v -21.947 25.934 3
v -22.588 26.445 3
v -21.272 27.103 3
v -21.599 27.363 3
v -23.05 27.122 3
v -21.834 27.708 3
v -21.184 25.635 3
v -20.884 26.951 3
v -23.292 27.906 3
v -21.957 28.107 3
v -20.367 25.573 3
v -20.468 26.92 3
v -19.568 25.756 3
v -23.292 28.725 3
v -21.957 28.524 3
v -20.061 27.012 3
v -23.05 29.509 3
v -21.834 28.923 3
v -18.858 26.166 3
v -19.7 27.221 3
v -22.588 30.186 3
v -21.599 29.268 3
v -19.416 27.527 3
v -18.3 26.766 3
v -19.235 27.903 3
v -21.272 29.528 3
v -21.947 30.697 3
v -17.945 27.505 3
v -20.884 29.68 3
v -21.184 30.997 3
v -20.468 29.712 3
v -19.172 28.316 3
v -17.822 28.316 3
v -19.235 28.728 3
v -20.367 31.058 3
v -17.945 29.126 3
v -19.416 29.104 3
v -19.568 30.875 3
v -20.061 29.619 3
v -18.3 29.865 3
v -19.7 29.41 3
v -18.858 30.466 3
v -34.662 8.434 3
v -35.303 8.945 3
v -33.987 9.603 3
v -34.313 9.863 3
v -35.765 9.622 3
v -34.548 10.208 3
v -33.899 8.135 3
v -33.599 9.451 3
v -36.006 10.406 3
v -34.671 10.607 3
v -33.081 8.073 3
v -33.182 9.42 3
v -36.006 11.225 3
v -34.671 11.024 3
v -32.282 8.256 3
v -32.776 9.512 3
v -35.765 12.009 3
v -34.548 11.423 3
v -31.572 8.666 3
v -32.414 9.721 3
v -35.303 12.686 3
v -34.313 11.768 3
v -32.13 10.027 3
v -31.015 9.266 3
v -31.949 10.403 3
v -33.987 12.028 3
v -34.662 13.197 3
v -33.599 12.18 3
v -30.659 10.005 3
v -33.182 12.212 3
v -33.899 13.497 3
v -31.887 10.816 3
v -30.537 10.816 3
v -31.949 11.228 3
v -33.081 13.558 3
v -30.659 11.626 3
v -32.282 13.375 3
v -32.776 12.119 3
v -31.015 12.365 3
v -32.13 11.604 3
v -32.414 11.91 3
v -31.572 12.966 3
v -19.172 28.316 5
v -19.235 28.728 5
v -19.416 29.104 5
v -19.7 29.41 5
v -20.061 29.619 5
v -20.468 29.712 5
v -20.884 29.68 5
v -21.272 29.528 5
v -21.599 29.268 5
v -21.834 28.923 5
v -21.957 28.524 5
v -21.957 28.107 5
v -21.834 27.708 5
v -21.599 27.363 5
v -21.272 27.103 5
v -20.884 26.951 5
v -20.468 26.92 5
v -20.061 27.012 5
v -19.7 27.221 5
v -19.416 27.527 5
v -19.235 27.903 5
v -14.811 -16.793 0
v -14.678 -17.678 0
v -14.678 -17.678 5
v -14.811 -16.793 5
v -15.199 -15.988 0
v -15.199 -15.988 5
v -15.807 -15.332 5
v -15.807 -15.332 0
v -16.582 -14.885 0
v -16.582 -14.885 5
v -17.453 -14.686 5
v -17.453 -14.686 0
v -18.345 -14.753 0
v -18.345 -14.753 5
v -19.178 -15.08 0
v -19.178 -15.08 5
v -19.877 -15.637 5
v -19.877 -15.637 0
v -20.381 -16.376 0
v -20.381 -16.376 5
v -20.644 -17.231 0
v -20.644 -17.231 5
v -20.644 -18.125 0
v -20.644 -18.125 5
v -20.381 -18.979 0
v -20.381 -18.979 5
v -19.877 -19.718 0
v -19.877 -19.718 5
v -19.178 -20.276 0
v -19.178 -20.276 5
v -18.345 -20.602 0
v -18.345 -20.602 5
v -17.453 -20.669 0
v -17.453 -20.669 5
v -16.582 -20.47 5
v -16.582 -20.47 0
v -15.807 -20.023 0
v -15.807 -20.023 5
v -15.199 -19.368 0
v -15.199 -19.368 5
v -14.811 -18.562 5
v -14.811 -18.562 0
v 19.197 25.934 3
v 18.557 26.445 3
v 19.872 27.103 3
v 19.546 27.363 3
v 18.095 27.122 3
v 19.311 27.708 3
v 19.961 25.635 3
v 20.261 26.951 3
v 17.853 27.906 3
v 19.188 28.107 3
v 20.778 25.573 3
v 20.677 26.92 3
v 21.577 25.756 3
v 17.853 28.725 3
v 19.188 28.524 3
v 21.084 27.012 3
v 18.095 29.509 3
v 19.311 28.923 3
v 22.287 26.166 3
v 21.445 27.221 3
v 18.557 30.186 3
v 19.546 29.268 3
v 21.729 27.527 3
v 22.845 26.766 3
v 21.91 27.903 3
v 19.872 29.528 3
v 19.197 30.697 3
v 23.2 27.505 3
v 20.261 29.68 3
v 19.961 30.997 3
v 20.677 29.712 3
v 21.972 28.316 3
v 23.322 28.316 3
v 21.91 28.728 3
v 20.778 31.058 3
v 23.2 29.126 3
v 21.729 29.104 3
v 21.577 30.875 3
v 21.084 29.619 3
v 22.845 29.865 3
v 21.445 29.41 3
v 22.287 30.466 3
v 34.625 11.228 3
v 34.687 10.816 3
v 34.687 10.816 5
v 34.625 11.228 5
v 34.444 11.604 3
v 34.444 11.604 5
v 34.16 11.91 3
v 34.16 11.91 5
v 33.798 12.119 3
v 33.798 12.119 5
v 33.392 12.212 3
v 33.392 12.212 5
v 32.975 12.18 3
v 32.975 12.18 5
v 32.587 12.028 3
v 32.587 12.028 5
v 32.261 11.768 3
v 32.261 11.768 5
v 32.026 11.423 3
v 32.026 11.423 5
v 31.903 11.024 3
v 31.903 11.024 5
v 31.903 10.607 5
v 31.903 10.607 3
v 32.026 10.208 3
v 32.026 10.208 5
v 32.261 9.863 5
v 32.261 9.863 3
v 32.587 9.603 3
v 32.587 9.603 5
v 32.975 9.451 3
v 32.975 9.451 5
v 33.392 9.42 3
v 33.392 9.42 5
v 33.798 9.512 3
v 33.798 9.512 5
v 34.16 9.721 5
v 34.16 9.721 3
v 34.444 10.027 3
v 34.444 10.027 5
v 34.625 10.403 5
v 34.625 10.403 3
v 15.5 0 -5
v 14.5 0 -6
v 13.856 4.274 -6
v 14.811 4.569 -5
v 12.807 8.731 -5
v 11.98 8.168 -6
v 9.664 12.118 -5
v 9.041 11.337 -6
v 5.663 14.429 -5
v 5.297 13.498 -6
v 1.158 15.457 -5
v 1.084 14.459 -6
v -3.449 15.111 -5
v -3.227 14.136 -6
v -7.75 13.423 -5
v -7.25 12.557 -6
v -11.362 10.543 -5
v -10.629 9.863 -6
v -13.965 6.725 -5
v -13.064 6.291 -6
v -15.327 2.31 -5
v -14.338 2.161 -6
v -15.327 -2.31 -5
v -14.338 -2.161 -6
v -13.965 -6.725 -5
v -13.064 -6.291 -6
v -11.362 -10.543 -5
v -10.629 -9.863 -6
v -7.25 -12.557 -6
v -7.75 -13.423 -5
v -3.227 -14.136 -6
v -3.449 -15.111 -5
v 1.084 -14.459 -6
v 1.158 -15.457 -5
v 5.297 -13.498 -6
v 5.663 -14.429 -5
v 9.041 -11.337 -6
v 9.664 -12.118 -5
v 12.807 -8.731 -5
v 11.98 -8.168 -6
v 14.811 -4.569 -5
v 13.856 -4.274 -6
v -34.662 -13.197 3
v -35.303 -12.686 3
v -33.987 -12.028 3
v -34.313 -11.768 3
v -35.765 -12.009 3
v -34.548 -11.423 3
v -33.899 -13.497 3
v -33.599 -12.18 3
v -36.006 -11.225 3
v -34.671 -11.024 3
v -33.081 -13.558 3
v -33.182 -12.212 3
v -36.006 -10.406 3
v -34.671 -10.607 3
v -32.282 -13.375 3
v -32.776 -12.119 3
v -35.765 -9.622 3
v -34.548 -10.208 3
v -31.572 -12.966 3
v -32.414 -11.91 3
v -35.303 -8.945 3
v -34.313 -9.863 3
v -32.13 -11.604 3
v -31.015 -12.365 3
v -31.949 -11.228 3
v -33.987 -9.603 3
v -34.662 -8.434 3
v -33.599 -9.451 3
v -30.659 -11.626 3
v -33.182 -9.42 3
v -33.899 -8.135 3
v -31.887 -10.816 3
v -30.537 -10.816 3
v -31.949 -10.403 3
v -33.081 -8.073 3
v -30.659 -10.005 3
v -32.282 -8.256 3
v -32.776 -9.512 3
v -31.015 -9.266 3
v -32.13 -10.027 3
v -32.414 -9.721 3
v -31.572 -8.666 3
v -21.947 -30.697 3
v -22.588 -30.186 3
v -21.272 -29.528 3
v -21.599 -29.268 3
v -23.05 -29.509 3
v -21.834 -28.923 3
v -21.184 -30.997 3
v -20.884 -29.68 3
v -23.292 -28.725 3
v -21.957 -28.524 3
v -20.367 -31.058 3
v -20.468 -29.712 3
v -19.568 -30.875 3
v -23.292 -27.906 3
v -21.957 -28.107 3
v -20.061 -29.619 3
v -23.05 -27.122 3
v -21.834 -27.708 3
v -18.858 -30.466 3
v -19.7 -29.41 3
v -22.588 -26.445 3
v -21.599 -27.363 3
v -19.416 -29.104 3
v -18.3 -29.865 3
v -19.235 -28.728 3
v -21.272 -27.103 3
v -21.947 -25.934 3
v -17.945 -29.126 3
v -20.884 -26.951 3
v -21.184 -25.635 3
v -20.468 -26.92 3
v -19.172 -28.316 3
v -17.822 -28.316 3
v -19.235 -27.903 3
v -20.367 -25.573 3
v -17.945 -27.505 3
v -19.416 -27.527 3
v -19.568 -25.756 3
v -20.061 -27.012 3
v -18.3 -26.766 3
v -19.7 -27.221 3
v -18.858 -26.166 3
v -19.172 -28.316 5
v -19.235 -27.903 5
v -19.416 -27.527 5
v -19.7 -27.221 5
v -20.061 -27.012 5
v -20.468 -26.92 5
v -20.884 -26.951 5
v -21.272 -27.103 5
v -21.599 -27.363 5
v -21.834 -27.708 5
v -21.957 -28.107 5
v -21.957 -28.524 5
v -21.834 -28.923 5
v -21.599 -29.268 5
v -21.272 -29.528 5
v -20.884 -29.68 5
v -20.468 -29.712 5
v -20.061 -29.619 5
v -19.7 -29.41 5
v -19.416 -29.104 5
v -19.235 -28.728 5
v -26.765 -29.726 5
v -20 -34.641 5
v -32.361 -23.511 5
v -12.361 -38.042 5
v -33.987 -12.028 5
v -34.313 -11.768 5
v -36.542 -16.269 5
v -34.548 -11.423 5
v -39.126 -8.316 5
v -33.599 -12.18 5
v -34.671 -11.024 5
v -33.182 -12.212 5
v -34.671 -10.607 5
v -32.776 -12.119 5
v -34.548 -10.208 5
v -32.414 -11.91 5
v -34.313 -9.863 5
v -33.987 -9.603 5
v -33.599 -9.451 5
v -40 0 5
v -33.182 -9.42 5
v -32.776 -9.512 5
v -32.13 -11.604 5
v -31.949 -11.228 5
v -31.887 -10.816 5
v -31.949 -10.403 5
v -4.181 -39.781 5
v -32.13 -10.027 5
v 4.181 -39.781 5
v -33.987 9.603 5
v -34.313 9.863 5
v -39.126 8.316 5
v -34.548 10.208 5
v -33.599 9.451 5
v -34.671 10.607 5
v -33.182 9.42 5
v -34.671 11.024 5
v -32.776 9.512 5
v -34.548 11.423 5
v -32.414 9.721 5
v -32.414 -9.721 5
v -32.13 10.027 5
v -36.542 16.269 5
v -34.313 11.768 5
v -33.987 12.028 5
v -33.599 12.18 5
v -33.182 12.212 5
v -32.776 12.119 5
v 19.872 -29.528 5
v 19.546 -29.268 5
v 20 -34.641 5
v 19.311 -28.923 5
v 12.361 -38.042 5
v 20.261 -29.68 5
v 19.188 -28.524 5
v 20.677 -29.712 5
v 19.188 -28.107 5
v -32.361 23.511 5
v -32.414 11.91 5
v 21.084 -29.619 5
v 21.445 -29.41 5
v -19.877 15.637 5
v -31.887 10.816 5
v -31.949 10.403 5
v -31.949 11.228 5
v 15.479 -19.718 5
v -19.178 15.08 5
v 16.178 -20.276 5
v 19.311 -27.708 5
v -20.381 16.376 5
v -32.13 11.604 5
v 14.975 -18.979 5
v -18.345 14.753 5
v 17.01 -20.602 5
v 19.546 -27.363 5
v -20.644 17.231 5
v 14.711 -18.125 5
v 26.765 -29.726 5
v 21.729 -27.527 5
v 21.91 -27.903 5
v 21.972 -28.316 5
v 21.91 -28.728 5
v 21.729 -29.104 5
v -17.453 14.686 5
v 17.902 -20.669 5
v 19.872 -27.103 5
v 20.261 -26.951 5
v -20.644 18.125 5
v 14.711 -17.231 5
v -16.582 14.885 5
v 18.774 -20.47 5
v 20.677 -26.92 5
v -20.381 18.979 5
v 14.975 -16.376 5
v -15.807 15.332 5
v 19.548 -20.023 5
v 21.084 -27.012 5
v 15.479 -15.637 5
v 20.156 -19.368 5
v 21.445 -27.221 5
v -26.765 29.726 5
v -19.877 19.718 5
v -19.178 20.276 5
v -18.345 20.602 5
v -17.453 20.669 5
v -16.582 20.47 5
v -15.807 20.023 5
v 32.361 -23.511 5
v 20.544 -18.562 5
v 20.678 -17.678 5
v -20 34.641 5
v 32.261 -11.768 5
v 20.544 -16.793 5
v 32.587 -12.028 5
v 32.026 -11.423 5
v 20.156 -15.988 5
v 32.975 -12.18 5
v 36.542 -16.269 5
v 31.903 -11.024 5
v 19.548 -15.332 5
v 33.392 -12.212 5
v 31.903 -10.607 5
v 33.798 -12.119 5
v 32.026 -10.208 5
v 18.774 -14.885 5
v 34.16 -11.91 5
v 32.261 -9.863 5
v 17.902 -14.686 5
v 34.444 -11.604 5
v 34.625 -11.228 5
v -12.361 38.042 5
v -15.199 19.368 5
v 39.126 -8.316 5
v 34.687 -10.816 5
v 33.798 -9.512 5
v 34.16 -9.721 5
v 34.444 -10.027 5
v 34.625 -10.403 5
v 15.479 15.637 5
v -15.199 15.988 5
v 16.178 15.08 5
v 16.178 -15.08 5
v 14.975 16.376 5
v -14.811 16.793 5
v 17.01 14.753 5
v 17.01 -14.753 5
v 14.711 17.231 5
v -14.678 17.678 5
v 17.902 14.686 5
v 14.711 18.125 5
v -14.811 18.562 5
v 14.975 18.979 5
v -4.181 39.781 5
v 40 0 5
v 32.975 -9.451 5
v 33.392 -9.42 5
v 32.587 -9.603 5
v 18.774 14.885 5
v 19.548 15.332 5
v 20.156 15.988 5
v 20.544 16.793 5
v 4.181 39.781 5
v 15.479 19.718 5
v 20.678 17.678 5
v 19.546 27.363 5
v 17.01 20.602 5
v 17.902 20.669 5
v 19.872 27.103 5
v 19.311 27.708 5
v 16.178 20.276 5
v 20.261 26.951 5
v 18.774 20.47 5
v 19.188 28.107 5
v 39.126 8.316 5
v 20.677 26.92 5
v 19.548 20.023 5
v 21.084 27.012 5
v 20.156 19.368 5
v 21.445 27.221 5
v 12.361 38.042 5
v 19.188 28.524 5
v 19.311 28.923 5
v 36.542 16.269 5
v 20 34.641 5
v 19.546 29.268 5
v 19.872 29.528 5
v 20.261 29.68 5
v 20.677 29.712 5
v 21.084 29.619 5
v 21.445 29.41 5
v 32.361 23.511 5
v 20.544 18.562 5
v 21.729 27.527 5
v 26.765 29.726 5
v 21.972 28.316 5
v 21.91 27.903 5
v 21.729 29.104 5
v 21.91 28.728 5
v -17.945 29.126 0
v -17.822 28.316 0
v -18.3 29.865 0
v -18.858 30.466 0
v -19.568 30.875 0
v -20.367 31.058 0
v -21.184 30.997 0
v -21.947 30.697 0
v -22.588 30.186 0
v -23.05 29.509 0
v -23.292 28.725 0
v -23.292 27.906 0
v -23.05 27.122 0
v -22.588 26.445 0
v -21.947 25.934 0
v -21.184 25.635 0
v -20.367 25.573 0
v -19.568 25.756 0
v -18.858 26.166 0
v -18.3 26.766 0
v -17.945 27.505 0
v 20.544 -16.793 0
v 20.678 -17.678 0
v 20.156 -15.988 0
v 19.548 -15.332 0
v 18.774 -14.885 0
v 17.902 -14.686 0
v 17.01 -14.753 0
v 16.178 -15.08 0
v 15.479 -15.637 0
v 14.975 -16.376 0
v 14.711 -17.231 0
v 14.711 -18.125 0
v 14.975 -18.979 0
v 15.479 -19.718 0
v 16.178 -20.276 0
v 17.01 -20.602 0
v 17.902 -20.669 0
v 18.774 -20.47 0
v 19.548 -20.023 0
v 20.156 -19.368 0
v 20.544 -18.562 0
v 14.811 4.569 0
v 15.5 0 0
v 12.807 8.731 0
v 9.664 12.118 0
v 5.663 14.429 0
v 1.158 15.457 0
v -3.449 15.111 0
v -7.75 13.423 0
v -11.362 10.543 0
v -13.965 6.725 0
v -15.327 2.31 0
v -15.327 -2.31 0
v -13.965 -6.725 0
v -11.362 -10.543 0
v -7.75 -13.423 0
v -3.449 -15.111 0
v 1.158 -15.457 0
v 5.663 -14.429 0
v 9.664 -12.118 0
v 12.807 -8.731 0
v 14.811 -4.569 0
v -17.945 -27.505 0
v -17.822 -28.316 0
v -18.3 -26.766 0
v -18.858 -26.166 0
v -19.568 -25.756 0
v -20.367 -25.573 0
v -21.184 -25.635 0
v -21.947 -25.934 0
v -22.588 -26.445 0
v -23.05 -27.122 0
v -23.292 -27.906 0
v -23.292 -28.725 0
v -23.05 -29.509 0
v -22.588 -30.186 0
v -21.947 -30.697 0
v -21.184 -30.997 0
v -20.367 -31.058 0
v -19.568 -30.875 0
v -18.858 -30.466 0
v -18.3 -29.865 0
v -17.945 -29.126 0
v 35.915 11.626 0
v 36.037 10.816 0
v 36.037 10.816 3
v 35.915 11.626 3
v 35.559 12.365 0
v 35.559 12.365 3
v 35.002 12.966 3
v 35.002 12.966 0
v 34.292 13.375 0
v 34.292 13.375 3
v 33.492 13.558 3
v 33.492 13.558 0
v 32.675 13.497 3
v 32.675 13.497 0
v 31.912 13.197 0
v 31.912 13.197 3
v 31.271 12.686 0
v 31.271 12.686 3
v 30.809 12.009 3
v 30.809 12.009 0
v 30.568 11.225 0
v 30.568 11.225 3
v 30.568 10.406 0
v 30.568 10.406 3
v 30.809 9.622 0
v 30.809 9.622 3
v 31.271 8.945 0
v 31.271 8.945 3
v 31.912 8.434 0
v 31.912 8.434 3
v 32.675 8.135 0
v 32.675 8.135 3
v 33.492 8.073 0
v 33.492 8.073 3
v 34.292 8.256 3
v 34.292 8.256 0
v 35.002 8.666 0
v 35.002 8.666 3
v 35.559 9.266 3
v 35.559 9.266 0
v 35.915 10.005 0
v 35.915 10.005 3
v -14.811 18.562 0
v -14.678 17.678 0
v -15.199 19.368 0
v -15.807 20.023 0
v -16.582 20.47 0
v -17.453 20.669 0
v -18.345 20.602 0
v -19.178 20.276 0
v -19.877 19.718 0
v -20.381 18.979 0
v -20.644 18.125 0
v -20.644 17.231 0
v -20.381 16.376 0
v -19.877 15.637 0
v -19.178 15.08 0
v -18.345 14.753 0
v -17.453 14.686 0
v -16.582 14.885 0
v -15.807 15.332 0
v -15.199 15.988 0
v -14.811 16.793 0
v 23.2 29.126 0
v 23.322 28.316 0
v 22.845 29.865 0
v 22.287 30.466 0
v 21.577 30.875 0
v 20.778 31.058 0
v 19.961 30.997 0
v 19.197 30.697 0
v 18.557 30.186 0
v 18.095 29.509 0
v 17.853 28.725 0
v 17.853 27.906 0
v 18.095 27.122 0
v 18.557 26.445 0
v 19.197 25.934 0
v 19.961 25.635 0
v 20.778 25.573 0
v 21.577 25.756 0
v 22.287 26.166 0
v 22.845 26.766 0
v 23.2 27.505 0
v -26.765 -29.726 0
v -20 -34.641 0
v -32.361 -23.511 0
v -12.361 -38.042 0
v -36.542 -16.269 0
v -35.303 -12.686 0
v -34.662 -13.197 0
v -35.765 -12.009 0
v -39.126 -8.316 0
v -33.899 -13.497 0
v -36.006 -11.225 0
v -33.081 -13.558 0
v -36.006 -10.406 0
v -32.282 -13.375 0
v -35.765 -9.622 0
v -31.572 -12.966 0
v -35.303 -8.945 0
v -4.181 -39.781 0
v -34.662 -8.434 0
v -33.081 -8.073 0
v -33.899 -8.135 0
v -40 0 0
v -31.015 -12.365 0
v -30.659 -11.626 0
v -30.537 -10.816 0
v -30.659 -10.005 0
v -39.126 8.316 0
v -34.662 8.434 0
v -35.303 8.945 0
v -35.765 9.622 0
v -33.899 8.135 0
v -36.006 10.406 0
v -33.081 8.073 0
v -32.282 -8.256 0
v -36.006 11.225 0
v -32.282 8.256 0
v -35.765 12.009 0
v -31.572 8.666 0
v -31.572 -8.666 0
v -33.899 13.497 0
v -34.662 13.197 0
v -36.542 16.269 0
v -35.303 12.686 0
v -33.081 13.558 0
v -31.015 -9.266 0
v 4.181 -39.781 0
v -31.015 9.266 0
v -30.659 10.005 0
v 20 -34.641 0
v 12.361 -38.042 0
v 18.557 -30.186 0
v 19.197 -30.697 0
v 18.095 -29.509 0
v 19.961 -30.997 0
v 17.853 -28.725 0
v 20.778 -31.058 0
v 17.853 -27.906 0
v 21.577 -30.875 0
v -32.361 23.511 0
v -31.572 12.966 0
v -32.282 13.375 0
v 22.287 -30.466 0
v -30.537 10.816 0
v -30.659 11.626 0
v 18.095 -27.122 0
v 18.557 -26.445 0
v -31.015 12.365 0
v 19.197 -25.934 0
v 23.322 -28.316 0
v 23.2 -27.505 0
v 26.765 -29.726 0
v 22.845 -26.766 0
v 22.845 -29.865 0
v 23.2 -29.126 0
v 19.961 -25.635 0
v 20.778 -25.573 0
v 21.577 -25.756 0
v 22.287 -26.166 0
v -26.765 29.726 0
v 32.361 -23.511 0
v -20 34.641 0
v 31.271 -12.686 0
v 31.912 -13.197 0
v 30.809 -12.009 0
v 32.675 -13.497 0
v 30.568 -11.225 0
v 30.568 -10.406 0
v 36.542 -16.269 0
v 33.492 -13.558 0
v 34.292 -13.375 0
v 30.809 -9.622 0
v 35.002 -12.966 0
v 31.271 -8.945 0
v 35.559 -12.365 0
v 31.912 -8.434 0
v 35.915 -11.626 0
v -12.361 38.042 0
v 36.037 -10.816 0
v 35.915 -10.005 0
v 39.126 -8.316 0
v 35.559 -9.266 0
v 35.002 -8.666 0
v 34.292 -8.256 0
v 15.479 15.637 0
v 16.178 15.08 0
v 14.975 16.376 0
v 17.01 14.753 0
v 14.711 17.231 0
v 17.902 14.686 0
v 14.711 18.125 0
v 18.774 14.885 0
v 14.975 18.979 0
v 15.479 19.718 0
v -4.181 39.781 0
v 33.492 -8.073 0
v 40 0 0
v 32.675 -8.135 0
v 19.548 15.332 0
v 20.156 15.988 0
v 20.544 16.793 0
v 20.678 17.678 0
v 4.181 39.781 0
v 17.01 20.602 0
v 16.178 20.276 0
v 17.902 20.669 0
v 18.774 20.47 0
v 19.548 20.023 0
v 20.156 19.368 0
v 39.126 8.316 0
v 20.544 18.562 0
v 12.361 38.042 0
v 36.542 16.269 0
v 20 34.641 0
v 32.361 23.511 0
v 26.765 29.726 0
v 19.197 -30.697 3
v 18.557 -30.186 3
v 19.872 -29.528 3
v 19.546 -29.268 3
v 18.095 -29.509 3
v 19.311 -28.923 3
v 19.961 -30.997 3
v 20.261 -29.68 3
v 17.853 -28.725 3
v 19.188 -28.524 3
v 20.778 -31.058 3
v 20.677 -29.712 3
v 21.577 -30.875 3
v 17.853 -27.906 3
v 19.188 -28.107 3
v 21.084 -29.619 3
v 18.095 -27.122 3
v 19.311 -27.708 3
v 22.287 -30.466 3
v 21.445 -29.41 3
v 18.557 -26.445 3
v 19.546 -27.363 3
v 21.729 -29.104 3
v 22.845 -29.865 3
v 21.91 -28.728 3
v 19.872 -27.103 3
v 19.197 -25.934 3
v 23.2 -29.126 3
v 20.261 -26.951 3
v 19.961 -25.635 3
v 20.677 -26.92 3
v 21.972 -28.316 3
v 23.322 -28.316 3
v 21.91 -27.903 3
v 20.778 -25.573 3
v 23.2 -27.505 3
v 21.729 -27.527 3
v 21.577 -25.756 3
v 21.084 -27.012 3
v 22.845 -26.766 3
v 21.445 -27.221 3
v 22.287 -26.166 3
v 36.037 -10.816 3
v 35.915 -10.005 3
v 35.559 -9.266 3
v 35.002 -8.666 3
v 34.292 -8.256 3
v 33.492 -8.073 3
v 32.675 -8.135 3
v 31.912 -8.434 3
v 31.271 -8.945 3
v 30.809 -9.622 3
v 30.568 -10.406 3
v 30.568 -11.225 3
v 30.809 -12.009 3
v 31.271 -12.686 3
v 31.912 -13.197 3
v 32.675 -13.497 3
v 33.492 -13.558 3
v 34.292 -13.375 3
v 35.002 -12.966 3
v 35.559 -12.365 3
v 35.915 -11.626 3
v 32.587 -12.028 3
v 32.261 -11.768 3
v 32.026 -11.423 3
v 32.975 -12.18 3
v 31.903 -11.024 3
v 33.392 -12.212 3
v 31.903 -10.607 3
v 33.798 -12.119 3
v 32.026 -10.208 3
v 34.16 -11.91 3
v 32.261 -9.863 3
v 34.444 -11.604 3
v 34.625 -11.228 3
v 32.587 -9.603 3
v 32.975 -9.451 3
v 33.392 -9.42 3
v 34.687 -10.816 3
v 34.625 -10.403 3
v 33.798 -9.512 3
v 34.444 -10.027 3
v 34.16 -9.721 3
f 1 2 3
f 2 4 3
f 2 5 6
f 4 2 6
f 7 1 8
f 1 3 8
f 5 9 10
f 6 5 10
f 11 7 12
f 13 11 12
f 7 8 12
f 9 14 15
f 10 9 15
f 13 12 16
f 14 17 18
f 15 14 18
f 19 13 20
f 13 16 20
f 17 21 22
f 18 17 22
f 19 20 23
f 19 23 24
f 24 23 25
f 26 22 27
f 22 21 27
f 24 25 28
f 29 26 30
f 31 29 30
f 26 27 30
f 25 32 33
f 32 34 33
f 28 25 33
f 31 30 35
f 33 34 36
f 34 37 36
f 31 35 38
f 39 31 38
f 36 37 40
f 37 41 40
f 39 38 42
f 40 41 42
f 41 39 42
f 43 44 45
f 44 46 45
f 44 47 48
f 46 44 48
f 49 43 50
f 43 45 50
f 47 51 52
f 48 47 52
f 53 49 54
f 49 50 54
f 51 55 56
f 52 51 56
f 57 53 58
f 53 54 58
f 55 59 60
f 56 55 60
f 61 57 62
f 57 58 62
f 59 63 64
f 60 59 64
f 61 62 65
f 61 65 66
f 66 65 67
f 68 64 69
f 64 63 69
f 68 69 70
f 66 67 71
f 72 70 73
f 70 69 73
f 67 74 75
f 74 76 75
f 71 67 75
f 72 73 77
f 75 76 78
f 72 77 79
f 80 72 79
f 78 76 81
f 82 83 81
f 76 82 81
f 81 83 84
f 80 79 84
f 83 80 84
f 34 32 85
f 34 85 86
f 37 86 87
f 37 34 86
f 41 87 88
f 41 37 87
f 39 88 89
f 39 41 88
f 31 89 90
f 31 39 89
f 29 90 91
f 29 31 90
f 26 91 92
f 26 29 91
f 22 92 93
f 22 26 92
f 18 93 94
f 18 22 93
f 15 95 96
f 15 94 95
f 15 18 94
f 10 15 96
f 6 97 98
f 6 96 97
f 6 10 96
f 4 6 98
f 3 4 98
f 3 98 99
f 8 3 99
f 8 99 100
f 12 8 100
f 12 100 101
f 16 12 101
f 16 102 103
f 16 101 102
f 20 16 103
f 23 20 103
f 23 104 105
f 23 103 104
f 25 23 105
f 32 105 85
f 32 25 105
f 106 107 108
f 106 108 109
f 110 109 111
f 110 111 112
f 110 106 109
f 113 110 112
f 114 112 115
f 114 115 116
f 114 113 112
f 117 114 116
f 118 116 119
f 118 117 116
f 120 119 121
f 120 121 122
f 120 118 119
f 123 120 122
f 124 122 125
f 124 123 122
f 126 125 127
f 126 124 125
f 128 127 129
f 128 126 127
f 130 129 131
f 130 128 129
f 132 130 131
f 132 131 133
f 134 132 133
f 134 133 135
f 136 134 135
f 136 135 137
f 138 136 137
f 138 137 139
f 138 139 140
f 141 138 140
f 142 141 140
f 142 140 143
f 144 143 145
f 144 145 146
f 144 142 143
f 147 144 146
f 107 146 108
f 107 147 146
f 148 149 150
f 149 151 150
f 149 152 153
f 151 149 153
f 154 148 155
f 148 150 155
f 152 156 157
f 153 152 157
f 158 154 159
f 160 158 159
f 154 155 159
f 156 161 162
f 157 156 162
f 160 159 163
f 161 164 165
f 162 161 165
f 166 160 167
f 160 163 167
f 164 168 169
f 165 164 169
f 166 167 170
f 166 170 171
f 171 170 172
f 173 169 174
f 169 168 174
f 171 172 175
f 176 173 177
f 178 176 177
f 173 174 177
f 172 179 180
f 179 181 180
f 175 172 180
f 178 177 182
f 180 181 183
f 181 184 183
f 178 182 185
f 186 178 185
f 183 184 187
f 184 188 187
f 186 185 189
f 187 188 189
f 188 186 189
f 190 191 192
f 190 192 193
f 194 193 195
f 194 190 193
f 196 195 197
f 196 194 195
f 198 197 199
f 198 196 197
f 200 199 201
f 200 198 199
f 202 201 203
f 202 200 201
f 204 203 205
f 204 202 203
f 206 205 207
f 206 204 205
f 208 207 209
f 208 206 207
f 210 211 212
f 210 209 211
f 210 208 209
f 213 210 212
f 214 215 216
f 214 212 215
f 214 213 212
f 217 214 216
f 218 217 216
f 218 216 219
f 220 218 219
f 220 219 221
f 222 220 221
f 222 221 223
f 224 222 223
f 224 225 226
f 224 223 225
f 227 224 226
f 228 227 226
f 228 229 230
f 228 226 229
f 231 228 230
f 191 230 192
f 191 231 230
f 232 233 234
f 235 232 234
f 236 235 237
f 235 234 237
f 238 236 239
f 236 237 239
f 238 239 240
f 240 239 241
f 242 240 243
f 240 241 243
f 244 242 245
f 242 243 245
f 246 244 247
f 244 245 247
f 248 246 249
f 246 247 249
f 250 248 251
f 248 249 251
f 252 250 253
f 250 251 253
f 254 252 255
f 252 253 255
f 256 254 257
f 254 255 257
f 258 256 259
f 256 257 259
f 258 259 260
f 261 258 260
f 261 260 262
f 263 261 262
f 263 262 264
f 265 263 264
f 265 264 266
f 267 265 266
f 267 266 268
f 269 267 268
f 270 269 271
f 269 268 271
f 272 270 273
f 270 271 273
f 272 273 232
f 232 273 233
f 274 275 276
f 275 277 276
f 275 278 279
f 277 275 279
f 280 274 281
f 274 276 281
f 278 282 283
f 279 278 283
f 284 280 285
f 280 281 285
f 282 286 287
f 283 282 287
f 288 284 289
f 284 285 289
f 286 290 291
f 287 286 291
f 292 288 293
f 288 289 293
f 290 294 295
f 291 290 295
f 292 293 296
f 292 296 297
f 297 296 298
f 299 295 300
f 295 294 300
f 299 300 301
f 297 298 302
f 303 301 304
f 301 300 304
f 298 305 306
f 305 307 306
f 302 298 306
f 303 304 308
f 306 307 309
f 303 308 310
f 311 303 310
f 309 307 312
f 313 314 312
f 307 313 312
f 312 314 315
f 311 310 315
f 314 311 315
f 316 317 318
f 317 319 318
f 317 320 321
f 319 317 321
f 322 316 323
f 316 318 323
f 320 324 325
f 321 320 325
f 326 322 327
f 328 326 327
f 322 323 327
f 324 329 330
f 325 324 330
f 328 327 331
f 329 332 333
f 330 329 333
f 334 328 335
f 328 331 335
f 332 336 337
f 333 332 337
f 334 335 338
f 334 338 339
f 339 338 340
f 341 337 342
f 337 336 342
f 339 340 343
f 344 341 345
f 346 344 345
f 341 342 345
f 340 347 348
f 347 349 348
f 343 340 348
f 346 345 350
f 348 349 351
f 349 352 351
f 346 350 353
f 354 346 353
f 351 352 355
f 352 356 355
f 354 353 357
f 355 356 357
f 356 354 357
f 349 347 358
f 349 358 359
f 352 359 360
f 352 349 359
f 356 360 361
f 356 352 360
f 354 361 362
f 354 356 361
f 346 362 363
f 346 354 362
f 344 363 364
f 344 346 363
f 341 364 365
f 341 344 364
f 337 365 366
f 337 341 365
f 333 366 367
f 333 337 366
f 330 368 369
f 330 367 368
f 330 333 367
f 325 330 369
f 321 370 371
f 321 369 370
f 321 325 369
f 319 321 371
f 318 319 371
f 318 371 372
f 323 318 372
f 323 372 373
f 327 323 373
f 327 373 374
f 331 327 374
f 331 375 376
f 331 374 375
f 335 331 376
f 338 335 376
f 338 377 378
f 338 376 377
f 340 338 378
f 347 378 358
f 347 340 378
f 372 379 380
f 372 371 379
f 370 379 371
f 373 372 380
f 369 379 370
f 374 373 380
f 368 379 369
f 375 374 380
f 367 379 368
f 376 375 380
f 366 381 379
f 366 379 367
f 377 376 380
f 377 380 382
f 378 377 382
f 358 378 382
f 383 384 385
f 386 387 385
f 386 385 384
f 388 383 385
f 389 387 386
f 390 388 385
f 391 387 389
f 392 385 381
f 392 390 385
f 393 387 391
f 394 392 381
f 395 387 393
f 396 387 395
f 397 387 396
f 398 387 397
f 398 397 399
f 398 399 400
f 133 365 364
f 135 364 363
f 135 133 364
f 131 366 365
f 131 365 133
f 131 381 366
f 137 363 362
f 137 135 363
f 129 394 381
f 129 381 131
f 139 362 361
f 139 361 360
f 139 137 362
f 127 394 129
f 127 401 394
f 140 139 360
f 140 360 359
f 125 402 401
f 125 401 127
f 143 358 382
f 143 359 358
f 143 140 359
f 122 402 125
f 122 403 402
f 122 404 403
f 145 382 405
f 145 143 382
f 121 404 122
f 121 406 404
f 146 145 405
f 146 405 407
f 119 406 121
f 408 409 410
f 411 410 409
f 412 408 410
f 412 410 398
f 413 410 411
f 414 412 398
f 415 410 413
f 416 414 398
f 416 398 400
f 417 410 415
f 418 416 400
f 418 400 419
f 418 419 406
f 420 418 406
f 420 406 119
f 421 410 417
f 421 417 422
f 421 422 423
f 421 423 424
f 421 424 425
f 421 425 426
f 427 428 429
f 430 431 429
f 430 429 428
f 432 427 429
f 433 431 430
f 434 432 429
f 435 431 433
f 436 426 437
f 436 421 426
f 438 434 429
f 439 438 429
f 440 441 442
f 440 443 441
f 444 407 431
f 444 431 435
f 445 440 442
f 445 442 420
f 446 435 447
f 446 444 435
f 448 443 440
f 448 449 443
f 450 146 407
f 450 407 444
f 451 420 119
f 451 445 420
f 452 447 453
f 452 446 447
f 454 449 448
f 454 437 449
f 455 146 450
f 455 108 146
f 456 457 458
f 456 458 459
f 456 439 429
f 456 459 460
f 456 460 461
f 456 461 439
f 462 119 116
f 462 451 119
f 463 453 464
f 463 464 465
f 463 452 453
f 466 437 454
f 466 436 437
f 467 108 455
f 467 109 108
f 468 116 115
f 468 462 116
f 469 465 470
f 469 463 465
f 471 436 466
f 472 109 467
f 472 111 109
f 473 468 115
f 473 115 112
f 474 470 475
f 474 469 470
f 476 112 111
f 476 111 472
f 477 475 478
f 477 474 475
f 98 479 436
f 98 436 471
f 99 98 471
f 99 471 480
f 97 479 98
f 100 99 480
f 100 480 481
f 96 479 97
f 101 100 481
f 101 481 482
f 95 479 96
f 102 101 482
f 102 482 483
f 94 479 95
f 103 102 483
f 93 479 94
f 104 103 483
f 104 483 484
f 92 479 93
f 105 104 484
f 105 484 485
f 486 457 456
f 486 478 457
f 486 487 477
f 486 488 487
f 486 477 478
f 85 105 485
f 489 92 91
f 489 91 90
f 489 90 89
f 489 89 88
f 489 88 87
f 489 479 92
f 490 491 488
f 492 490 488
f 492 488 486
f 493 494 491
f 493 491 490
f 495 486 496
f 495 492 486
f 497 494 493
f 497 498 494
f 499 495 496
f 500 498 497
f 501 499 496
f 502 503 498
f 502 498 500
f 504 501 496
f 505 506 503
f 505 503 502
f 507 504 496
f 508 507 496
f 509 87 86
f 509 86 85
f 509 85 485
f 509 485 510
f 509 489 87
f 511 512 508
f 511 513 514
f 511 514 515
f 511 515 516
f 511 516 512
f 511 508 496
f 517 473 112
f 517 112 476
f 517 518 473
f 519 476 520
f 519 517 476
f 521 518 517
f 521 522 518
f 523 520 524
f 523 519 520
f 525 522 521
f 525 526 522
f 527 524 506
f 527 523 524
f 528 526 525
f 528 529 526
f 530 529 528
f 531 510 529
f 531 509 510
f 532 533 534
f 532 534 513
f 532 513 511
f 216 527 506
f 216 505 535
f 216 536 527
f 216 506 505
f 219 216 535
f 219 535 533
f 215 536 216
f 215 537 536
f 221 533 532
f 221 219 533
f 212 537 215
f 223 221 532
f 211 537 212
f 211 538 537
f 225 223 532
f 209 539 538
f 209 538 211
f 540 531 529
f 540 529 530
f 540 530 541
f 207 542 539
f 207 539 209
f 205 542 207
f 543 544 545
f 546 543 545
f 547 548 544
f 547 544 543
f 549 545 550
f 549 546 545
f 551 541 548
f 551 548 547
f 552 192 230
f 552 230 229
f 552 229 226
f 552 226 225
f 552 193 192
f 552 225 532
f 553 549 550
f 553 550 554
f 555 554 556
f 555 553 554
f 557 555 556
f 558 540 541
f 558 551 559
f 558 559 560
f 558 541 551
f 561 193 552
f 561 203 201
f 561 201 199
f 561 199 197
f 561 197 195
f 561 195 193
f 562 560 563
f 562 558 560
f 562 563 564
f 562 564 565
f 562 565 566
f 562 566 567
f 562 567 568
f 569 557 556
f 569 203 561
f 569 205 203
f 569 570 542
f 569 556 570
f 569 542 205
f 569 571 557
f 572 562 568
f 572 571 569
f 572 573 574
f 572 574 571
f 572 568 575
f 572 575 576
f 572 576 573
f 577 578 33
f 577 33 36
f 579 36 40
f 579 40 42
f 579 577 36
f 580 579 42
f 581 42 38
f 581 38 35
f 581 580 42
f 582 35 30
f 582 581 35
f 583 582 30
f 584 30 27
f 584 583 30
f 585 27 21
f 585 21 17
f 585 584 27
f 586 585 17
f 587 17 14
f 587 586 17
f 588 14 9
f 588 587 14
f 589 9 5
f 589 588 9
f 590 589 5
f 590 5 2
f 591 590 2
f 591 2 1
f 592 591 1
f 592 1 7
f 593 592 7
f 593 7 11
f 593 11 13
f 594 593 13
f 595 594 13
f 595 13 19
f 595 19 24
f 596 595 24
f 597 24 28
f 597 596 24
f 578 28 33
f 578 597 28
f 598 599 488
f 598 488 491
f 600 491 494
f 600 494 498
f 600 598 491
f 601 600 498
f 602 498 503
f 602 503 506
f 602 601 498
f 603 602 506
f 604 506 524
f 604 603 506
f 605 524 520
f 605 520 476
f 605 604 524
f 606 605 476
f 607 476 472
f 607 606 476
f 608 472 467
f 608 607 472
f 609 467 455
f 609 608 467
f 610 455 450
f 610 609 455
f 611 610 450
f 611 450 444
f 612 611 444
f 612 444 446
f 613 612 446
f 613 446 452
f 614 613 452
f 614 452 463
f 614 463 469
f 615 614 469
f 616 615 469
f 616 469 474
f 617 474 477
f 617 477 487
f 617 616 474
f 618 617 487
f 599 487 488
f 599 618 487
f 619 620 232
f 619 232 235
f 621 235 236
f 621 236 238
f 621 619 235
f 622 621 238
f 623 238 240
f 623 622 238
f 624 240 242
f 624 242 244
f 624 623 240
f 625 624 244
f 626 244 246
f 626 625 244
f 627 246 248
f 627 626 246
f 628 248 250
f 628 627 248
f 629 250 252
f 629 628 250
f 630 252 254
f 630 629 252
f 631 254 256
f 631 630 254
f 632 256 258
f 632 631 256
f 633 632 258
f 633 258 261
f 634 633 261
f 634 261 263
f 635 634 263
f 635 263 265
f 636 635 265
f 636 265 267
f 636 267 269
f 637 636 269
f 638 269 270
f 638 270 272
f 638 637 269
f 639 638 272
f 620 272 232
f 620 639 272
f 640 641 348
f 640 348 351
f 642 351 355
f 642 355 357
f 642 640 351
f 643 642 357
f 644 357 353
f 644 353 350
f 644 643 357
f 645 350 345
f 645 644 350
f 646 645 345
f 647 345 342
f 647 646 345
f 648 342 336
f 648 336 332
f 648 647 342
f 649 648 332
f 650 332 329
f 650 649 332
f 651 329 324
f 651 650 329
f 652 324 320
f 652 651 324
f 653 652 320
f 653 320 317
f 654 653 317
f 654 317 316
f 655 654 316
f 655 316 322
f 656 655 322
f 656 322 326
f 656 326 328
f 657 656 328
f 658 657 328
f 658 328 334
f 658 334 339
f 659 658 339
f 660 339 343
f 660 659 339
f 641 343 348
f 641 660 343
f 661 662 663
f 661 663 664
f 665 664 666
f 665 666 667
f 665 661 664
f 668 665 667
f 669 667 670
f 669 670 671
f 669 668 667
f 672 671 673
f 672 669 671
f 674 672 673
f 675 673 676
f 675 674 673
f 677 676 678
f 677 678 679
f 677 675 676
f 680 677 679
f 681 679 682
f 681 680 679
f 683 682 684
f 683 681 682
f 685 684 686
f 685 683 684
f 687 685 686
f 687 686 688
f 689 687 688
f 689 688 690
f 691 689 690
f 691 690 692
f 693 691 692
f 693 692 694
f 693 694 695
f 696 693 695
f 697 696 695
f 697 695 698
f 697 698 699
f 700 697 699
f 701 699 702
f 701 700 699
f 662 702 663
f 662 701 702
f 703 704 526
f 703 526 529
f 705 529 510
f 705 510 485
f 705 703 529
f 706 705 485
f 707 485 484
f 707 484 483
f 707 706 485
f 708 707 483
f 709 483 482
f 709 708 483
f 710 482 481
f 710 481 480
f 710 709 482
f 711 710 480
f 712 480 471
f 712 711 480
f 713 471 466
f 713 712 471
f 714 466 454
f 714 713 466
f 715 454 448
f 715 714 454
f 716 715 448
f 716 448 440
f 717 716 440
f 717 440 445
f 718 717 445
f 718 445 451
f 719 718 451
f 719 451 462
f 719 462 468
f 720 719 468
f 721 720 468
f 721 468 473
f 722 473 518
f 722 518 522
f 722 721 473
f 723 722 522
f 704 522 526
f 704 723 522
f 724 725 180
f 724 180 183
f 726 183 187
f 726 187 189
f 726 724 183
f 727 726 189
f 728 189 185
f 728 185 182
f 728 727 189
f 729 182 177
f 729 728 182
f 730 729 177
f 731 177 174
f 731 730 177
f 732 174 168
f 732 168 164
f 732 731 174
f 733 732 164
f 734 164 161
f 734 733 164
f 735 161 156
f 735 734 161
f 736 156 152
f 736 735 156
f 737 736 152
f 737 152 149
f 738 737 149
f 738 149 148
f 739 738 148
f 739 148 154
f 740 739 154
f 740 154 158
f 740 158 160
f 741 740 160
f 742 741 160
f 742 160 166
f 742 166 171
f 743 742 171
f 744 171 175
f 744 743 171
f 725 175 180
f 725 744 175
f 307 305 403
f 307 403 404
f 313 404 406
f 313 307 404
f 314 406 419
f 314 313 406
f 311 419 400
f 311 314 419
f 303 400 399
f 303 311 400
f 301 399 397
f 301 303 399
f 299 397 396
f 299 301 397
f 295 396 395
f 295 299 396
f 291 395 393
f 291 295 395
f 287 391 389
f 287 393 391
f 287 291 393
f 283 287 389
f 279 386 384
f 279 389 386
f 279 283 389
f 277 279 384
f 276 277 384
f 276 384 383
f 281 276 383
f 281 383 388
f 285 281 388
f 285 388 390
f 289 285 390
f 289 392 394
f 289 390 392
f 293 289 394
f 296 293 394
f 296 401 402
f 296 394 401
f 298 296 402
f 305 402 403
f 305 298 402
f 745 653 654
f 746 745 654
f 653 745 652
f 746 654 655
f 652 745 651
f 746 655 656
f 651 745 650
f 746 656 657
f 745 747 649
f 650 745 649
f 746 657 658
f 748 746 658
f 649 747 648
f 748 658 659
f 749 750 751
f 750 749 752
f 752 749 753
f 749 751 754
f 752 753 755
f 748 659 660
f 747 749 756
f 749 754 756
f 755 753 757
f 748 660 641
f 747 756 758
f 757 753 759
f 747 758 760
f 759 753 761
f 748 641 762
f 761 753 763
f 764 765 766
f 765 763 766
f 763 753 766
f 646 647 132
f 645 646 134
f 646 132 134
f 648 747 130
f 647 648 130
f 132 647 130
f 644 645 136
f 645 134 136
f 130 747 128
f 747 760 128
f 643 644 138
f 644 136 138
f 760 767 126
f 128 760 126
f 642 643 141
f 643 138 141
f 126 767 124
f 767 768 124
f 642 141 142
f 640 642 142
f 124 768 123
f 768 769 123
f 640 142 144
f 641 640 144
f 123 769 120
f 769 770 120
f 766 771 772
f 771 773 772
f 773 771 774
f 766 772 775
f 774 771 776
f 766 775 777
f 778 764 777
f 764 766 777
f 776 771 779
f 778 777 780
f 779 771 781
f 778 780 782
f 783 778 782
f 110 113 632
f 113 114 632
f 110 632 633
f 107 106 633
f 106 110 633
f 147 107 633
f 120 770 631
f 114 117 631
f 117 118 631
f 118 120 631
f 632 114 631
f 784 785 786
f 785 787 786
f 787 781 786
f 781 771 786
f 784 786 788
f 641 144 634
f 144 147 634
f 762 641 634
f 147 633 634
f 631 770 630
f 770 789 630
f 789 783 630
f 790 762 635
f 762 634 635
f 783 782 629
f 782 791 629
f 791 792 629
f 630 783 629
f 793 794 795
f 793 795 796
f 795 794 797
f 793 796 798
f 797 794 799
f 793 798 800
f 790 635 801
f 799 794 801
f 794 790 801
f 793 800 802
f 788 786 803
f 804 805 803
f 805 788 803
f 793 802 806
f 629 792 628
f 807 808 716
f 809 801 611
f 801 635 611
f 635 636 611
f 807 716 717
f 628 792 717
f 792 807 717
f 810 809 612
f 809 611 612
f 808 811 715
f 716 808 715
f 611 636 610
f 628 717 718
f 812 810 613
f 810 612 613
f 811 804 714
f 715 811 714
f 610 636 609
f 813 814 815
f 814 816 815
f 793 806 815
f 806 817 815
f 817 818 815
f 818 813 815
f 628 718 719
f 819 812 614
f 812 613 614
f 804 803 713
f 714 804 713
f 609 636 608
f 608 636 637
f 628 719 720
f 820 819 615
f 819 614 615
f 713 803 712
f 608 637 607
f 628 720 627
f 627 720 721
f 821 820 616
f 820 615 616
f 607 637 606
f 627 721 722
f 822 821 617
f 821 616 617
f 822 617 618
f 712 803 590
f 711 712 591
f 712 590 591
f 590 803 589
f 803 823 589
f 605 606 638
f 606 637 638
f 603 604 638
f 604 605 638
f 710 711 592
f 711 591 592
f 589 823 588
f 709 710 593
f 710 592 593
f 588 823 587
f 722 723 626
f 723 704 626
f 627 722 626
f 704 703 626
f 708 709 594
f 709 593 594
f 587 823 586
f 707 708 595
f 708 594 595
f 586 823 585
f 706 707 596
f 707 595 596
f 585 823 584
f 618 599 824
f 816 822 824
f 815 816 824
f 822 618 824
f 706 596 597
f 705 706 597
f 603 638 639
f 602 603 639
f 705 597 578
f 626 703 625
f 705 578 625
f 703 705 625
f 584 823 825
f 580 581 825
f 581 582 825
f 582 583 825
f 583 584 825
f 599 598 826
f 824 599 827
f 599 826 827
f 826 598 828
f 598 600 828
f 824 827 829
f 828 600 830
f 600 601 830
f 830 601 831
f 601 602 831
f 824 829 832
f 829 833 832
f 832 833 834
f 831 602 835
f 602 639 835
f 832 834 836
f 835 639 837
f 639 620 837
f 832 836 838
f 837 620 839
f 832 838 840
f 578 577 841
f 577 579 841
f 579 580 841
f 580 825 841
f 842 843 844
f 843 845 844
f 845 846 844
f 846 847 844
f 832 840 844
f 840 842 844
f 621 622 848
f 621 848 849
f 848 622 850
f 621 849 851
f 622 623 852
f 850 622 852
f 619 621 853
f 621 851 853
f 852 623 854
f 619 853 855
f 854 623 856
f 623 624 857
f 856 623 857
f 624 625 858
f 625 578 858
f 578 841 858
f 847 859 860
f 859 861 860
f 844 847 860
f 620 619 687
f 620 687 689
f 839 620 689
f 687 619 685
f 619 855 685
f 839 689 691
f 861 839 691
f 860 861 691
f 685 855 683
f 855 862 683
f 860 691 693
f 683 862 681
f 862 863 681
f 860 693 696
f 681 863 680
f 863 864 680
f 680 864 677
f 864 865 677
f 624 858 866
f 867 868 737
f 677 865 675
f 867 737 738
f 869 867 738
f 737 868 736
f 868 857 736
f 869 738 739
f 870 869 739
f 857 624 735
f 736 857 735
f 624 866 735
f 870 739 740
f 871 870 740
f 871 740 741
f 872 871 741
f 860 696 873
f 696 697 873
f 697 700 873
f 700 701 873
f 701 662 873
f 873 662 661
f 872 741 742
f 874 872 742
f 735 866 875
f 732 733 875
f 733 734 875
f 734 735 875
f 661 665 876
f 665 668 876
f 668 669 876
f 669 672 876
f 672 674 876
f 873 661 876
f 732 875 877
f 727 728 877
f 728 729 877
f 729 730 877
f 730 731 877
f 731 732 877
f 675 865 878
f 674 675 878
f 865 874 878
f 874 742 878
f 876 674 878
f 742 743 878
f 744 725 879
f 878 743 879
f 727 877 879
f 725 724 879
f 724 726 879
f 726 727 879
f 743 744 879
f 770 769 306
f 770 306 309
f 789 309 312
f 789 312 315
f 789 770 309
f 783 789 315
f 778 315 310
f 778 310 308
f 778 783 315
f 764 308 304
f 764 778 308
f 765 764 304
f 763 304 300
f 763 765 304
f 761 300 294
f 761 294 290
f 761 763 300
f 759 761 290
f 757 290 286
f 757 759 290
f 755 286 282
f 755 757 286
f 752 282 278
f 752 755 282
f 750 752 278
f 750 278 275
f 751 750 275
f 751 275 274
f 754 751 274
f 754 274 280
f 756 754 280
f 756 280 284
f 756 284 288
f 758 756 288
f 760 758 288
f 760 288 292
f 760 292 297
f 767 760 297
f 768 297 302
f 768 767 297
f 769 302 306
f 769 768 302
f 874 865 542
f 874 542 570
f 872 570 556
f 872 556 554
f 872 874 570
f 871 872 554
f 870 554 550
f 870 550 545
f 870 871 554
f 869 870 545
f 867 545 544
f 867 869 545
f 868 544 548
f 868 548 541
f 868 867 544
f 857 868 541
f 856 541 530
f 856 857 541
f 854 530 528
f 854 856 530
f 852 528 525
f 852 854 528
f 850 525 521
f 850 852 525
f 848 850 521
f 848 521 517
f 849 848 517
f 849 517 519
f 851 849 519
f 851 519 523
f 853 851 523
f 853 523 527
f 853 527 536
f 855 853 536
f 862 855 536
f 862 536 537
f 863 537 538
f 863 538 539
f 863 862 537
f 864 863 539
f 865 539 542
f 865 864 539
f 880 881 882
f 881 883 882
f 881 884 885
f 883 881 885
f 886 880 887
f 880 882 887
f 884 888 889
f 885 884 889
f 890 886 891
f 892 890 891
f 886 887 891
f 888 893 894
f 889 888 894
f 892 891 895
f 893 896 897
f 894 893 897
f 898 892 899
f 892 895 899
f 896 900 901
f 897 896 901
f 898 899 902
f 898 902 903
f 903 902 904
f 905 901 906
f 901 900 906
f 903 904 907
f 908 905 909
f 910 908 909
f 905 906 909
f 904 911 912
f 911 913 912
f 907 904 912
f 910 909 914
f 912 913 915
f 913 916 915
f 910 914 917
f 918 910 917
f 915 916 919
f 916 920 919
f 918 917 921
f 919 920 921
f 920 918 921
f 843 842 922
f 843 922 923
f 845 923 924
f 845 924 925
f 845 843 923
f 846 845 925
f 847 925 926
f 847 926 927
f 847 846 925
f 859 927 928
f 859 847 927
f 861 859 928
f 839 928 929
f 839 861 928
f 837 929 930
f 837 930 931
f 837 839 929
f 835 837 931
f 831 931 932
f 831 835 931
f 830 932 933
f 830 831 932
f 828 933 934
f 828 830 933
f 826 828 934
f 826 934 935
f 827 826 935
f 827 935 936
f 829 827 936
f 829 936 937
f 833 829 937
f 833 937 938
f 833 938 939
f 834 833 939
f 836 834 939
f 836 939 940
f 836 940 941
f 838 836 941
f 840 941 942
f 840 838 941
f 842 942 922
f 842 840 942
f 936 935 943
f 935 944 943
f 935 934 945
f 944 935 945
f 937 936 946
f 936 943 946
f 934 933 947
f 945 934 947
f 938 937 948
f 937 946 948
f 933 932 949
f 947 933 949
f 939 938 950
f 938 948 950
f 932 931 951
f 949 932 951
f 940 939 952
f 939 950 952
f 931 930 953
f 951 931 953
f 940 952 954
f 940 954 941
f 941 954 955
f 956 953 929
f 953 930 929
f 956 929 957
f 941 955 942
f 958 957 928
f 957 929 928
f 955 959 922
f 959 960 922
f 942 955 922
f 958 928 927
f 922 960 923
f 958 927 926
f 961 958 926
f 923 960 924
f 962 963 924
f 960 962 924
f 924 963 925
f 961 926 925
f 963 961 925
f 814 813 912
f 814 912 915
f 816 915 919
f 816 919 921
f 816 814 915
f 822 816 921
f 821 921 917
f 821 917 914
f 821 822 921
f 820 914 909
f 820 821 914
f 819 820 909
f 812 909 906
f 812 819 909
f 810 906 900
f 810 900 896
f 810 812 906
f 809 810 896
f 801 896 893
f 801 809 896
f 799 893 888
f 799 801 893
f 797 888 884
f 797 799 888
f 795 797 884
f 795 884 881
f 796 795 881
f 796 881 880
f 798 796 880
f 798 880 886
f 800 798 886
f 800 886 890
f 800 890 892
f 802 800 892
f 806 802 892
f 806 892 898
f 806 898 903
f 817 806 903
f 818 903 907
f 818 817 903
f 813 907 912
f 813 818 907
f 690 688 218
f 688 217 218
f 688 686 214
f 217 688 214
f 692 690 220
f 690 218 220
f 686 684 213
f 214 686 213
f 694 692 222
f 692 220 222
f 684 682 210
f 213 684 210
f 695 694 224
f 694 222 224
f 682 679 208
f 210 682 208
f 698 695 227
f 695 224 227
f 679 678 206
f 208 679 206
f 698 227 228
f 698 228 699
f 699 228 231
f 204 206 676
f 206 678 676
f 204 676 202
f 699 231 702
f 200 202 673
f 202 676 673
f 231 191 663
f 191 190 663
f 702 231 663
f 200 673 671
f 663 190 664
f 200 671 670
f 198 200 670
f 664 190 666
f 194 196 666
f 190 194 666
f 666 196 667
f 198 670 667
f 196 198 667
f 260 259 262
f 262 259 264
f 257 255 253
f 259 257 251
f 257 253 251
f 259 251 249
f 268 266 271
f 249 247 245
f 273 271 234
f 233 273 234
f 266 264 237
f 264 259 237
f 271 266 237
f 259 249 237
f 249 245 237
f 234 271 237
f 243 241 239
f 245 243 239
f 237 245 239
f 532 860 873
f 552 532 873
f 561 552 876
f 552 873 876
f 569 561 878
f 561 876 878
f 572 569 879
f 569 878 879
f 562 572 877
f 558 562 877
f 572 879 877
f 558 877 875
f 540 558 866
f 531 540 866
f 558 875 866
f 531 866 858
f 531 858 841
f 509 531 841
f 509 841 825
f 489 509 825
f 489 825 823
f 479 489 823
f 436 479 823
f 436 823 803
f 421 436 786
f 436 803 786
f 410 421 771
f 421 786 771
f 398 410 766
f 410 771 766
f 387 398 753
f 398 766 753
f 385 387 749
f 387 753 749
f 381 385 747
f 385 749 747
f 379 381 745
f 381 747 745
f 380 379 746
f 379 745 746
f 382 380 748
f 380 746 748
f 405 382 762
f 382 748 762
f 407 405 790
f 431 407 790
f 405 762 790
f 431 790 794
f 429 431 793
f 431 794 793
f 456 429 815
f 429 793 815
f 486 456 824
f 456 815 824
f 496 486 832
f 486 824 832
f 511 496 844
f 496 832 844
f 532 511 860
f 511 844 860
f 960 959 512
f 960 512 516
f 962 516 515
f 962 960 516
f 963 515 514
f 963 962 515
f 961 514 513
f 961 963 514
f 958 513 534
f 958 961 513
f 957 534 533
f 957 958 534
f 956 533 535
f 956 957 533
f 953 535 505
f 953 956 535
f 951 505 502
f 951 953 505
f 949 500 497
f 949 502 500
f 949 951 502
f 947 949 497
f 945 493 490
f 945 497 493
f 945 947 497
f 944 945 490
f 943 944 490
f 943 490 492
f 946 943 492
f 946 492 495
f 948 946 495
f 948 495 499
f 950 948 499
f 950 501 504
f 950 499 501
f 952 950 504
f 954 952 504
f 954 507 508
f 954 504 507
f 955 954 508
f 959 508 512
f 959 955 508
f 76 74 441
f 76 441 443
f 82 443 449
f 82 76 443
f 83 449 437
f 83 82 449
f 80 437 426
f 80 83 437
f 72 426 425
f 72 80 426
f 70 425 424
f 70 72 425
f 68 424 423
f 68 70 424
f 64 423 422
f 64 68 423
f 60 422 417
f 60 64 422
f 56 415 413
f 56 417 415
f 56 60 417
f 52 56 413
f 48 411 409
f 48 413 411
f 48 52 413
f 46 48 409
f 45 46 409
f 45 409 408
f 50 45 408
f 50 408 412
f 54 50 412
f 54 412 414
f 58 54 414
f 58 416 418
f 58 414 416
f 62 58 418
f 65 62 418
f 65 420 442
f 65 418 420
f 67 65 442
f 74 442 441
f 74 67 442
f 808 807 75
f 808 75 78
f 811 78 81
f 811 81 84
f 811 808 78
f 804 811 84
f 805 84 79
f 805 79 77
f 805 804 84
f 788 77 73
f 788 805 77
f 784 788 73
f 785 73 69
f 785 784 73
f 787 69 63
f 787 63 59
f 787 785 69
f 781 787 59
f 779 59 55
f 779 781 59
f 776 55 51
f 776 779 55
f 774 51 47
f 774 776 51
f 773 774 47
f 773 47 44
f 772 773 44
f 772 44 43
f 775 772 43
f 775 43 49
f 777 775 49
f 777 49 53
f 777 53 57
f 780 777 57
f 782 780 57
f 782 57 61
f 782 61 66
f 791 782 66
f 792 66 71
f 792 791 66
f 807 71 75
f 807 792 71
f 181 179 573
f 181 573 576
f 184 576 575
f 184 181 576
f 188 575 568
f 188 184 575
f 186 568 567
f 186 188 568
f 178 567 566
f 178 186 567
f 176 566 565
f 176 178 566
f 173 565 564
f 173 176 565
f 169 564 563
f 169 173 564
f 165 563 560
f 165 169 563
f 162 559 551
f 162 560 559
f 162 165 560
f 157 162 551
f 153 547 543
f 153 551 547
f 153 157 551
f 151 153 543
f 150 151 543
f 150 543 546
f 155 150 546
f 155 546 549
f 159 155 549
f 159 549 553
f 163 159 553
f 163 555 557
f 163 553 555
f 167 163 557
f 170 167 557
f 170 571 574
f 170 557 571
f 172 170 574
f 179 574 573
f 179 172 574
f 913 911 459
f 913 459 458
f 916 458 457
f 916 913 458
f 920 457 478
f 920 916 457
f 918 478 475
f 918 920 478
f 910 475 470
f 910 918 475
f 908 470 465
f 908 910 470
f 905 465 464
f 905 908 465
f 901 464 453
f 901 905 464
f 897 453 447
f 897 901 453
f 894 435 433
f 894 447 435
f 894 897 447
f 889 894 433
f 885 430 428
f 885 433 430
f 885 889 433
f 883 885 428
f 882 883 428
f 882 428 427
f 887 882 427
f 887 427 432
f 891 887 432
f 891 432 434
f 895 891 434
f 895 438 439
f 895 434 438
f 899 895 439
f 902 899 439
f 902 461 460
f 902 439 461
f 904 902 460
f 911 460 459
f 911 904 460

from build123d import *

# Parameters (mm, degrees)
SKETCH1_R           = 40
BOSS_EXTRUDE1_DEPTH = 5
SKETCH1_5_R         = 3
CUT_EXTRUDE3_DEPTH  = 5
SKETCH1_8_R         = 15.5
BOSS_EXTRUDE2_DEPTH = 6
CHAMFER1_SIZE       = 1
SKETCH1_20_R        = 1.4
CUT_EXTRUDE12_DEPTH = 7
SKETCH1_22_R        = 2.75
CUT_EXTRUDE13_DEPTH = 3


with BuildPart() as part:
    # Sketch1 → Boss-Extrude1 (new body)
    with BuildSketch(Plane.XY):
        Circle(SKETCH1_R)
    extrude(amount=BOSS_EXTRUDE1_DEPTH)

    # Sketch1<5> → Cut-Extrude3 (cut)
    with BuildSketch(Plane.XY):
        with Locations((-17.67766953, 17.67766953)):
            Circle(SKETCH1_5_R)
        with Locations((17.67766953, 17.67766953)):
            Circle(SKETCH1_5_R)
        with Locations((17.67766953, -17.67766953)):
            Circle(SKETCH1_5_R)
        with Locations((-17.67766953, -17.67766953)):
            Circle(SKETCH1_5_R)
    extrude(amount=CUT_EXTRUDE3_DEPTH, mode=Mode.SUBTRACT)

    # Sketch1<8> → Boss-Extrude2 (add)
    with BuildSketch(Plane.XY):
        Circle(SKETCH1_8_R)
    extrude(amount=-BOSS_EXTRUDE2_DEPTH)

    # Chamfer1
    chamfer1_edges = [part.edges().sort_by_distance(p)[0] for p in [
        (-15.5, 0, -6),
    ]]
    chamfer(chamfer1_edges, length=CHAMFER1_SIZE)

    # Sketch1<20> → Cut-Extrude12 (cut)
    with BuildSketch(Plane.XY):
        with Locations((-20.57248383, 28.315594803)):
            Circle(SKETCH1_20_R)
        with Locations((20.57248383, 28.315594803)):
            Circle(SKETCH1_20_R)
        with Locations((33.28697807, 10.815594803)):
            Circle(SKETCH1_20_R)
        with Locations((33.28697807, -10.815594803)):
            Circle(SKETCH1_20_R)
        with Locations((20.57248383, -28.315594803)):
            Circle(SKETCH1_20_R)
        with Locations((-20.57248383, -28.315594803)):
            Circle(SKETCH1_20_R)
        with Locations((-33.28697807, -10.815594803)):
            Circle(SKETCH1_20_R)
        with Locations((-33.28697807, 10.815594803)):
            Circle(SKETCH1_20_R)
    extrude(amount=CUT_EXTRUDE12_DEPTH, mode=Mode.SUBTRACT)

    # Sketch1<22> → Cut-Extrude13 (cut)
    with BuildSketch(Plane.XY):
        with Locations((20.57248383, 28.315594803)):
            Circle(SKETCH1_22_R)
        with Locations((33.28697807, 10.815594803)):
            Circle(SKETCH1_22_R)
        with Locations((33.28697807, -10.815594803)):
            Circle(SKETCH1_22_R)
        with Locations((20.57248383, -28.315594803)):
            Circle(SKETCH1_22_R)
        with Locations((-20.57248383, -28.315594803)):
            Circle(SKETCH1_22_R)
        with Locations((-33.28697807, -10.815594803)):
            Circle(SKETCH1_22_R)
        with Locations((-33.28697807, 10.815594803)):
            Circle(SKETCH1_22_R)
        with Locations((-20.57248383, 28.315594803)):
            Circle(SKETCH1_22_R)
    extrude(amount=CUT_EXTRUDE13_DEPTH, mode=Mode.SUBTRACT)


solid = part.part
